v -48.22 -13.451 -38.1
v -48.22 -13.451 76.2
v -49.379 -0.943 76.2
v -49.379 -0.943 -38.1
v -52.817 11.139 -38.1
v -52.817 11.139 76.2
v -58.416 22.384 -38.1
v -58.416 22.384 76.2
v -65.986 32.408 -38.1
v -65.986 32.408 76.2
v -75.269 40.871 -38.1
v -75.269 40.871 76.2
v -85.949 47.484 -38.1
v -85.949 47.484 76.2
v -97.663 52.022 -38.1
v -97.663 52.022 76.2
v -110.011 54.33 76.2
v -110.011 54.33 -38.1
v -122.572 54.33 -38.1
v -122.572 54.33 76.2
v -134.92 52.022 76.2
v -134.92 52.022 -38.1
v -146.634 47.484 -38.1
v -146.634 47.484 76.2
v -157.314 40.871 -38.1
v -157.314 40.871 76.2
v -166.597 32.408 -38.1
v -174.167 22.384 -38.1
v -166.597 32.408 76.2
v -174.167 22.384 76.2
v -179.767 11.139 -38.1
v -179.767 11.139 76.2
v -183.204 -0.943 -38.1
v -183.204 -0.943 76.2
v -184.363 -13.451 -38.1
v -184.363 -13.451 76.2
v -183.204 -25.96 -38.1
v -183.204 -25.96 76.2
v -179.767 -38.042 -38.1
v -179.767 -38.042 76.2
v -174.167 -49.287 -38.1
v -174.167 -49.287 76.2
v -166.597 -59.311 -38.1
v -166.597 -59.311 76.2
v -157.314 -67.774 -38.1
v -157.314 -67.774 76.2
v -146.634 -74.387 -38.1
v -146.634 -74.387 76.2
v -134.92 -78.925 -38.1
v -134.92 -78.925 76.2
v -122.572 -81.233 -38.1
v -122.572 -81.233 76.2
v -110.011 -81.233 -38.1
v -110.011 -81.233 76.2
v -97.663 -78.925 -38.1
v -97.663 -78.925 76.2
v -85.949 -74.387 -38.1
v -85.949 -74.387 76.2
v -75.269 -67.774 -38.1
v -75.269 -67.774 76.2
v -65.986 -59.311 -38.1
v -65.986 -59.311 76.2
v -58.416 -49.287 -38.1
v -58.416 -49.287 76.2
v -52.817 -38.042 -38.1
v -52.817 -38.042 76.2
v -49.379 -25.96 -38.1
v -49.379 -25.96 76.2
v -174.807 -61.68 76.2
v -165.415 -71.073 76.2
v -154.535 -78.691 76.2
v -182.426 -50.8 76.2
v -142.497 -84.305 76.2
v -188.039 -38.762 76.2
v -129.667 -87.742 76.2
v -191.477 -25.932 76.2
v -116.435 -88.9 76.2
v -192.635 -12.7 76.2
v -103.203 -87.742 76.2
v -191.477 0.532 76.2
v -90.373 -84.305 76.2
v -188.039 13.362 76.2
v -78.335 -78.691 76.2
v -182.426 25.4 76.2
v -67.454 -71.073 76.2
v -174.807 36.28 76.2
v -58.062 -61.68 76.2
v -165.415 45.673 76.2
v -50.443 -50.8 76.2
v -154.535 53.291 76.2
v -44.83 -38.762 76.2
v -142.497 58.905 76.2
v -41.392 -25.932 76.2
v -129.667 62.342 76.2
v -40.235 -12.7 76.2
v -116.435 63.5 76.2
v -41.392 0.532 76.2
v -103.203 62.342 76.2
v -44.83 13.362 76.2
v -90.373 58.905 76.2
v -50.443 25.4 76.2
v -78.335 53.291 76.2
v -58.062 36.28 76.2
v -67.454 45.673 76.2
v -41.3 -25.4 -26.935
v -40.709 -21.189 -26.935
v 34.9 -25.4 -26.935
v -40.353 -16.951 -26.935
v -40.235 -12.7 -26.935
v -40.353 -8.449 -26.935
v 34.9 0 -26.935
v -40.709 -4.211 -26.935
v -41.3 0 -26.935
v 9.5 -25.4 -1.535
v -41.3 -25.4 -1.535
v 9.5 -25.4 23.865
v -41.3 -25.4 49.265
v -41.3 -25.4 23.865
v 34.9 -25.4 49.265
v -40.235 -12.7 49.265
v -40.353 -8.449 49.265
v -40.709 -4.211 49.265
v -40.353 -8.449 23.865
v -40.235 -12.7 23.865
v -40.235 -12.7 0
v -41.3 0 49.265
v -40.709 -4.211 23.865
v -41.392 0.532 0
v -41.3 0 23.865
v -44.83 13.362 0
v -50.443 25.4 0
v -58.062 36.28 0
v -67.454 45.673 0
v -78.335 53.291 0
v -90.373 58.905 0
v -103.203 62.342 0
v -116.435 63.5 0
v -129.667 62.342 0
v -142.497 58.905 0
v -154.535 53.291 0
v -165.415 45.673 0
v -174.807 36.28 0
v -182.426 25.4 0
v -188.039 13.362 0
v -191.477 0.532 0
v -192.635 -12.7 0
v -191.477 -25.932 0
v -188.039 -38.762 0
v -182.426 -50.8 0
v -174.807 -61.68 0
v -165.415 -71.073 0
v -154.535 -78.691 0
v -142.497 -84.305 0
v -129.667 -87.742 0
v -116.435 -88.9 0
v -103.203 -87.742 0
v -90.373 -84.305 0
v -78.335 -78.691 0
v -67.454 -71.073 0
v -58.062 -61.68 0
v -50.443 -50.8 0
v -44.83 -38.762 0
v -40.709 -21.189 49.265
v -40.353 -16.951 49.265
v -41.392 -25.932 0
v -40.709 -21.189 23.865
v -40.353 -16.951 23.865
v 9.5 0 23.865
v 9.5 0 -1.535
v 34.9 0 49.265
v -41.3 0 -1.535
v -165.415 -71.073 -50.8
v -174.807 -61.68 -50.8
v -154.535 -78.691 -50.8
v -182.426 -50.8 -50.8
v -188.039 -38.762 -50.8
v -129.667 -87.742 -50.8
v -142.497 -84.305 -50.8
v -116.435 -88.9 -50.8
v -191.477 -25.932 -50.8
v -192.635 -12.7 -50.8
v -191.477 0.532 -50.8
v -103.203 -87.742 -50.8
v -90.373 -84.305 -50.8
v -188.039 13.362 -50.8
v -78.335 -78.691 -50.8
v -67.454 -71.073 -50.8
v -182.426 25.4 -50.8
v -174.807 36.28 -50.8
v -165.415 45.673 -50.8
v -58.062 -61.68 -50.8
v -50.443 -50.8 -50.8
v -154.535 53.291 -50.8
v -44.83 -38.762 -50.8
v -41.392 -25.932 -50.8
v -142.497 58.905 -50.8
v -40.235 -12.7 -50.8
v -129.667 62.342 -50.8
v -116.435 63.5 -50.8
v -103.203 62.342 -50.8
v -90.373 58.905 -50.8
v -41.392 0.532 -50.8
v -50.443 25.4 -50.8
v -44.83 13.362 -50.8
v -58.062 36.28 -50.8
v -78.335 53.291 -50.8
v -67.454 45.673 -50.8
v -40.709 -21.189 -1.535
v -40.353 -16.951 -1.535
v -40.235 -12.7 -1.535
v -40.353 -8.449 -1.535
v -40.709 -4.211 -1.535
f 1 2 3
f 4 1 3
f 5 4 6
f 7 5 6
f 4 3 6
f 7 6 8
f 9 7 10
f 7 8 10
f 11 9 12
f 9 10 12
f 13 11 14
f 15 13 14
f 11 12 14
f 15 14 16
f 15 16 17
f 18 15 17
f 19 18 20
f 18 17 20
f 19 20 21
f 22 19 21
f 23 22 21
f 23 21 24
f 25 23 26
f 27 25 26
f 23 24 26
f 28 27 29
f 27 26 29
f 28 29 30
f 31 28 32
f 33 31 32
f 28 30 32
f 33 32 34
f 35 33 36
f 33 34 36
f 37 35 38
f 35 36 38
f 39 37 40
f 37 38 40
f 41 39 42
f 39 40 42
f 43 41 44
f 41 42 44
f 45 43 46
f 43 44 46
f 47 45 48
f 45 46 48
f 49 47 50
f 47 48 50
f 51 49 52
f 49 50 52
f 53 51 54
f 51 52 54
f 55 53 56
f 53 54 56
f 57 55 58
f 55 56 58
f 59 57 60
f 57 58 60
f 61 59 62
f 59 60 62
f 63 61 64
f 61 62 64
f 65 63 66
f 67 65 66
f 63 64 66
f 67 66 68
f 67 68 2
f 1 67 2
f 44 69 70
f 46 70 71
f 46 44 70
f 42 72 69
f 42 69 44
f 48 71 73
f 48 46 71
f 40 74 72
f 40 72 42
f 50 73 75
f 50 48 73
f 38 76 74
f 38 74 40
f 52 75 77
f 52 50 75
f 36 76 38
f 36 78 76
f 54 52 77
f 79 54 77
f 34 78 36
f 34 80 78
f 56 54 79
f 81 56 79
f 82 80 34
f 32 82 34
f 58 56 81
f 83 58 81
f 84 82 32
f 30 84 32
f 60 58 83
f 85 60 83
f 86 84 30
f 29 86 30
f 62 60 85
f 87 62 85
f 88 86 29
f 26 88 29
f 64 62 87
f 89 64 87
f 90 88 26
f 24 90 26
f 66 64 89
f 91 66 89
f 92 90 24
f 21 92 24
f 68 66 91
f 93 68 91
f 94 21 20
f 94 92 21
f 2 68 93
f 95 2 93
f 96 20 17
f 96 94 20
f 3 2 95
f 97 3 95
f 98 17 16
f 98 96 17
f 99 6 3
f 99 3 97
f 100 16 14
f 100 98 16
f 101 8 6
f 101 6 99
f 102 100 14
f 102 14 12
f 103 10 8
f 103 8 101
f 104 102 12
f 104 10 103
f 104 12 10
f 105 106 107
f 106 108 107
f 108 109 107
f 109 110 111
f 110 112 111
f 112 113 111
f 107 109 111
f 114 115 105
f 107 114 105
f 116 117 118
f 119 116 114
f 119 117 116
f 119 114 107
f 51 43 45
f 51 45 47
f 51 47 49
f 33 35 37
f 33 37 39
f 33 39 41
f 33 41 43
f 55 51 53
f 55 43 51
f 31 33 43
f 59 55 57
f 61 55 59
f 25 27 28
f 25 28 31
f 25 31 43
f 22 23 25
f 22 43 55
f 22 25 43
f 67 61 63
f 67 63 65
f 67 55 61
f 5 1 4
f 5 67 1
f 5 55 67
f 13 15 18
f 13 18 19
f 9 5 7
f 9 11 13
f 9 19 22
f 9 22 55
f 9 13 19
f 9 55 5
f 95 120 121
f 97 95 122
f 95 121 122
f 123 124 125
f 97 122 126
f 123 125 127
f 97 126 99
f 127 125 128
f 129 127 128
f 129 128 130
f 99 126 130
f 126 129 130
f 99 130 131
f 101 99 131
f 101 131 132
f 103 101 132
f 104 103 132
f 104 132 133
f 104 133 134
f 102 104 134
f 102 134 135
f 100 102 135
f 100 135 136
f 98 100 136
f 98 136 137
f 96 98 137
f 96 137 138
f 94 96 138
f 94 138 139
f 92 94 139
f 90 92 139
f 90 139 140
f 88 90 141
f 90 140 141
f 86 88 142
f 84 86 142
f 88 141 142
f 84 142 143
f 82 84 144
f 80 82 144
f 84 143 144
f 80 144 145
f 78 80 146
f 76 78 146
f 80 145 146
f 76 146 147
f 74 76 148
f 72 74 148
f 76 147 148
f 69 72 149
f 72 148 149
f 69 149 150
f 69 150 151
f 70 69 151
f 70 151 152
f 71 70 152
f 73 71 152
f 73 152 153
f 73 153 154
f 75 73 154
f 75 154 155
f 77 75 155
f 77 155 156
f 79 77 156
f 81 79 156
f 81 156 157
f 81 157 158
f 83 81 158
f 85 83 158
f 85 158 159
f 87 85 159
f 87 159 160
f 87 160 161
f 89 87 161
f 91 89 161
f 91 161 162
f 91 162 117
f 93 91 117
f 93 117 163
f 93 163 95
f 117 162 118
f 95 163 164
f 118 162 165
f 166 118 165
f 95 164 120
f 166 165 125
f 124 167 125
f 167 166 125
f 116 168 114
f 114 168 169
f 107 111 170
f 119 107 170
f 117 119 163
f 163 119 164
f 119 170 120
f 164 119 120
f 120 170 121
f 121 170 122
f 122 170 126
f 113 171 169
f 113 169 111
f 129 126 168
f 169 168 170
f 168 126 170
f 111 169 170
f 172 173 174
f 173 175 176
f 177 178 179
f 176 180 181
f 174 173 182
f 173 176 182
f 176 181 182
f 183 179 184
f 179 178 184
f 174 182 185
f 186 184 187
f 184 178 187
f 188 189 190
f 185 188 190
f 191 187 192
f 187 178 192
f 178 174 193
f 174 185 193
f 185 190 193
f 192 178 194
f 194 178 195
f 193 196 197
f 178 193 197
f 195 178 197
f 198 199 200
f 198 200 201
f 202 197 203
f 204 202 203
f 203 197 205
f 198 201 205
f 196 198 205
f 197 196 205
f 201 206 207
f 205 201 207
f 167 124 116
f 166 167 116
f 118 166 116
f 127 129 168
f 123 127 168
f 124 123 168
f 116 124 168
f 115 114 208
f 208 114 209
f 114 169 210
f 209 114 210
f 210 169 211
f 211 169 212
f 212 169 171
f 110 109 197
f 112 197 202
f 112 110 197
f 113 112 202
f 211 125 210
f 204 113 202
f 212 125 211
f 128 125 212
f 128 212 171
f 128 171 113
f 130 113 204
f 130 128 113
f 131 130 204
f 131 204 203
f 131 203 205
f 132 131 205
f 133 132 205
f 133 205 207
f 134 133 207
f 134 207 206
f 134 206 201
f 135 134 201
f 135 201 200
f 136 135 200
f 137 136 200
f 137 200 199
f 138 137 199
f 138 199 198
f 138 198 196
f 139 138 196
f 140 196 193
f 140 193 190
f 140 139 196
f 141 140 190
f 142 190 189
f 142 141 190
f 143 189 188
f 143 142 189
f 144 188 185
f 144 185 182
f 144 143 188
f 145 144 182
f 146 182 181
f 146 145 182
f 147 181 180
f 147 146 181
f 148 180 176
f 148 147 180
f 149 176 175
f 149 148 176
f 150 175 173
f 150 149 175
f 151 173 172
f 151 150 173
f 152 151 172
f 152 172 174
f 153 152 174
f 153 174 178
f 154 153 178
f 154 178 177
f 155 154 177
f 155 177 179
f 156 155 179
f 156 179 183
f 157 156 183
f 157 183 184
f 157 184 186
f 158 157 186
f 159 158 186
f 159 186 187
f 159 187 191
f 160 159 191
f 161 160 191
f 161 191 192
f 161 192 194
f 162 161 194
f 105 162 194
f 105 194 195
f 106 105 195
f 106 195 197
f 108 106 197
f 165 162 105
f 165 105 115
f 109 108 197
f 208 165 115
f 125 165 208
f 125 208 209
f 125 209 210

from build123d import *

# Parameters (mm, degrees)
F1_DEPTH      = 25.4
F2_R          = 76.2
F3_DEPTH      = 76.2
F3_DEPTH_BACK = 50.8
F5_R          = 68.0716373703
F6_DEPTH      = 114.3


with BuildPart() as f1:
    # F0 (on Front) → F1 (new body)
    with BuildSketch(Plane.XZ):
        Polygon((34.8995993793, 49.2647366976), (-41.3004006207, 49.2647366976), (-41.3004006207, 23.8647366976), (9.4995993793, 23.8647366976), (9.4995993793, -1.5352633024), (-41.3004006207, -1.5352633024), (-41.3004006207, -26.9352633024), (34.8995993793, -26.9352633024), align=None)
    extrude(amount=F1_DEPTH)

    # F2 (on Top) → F3 (join, two sides)
    with BuildSketch(Plane.XY) as f3_sk:
        with Locations((-116.4346138661, -12.7)):
            Circle(F2_R)
    extrude(amount=F3_DEPTH)
    extrude(f3_sk.sketch, amount=-F3_DEPTH_BACK)

    # F5 (on face) → F6 (cut)
    with BuildSketch(Plane.XY.offset(76.2)):
        with Locations((-116.2916272879, -13.451478444)):
            Circle(F5_R)
    extrude(amount=-F6_DEPTH, mode=Mode.SUBTRACT)


solid = f1.part
